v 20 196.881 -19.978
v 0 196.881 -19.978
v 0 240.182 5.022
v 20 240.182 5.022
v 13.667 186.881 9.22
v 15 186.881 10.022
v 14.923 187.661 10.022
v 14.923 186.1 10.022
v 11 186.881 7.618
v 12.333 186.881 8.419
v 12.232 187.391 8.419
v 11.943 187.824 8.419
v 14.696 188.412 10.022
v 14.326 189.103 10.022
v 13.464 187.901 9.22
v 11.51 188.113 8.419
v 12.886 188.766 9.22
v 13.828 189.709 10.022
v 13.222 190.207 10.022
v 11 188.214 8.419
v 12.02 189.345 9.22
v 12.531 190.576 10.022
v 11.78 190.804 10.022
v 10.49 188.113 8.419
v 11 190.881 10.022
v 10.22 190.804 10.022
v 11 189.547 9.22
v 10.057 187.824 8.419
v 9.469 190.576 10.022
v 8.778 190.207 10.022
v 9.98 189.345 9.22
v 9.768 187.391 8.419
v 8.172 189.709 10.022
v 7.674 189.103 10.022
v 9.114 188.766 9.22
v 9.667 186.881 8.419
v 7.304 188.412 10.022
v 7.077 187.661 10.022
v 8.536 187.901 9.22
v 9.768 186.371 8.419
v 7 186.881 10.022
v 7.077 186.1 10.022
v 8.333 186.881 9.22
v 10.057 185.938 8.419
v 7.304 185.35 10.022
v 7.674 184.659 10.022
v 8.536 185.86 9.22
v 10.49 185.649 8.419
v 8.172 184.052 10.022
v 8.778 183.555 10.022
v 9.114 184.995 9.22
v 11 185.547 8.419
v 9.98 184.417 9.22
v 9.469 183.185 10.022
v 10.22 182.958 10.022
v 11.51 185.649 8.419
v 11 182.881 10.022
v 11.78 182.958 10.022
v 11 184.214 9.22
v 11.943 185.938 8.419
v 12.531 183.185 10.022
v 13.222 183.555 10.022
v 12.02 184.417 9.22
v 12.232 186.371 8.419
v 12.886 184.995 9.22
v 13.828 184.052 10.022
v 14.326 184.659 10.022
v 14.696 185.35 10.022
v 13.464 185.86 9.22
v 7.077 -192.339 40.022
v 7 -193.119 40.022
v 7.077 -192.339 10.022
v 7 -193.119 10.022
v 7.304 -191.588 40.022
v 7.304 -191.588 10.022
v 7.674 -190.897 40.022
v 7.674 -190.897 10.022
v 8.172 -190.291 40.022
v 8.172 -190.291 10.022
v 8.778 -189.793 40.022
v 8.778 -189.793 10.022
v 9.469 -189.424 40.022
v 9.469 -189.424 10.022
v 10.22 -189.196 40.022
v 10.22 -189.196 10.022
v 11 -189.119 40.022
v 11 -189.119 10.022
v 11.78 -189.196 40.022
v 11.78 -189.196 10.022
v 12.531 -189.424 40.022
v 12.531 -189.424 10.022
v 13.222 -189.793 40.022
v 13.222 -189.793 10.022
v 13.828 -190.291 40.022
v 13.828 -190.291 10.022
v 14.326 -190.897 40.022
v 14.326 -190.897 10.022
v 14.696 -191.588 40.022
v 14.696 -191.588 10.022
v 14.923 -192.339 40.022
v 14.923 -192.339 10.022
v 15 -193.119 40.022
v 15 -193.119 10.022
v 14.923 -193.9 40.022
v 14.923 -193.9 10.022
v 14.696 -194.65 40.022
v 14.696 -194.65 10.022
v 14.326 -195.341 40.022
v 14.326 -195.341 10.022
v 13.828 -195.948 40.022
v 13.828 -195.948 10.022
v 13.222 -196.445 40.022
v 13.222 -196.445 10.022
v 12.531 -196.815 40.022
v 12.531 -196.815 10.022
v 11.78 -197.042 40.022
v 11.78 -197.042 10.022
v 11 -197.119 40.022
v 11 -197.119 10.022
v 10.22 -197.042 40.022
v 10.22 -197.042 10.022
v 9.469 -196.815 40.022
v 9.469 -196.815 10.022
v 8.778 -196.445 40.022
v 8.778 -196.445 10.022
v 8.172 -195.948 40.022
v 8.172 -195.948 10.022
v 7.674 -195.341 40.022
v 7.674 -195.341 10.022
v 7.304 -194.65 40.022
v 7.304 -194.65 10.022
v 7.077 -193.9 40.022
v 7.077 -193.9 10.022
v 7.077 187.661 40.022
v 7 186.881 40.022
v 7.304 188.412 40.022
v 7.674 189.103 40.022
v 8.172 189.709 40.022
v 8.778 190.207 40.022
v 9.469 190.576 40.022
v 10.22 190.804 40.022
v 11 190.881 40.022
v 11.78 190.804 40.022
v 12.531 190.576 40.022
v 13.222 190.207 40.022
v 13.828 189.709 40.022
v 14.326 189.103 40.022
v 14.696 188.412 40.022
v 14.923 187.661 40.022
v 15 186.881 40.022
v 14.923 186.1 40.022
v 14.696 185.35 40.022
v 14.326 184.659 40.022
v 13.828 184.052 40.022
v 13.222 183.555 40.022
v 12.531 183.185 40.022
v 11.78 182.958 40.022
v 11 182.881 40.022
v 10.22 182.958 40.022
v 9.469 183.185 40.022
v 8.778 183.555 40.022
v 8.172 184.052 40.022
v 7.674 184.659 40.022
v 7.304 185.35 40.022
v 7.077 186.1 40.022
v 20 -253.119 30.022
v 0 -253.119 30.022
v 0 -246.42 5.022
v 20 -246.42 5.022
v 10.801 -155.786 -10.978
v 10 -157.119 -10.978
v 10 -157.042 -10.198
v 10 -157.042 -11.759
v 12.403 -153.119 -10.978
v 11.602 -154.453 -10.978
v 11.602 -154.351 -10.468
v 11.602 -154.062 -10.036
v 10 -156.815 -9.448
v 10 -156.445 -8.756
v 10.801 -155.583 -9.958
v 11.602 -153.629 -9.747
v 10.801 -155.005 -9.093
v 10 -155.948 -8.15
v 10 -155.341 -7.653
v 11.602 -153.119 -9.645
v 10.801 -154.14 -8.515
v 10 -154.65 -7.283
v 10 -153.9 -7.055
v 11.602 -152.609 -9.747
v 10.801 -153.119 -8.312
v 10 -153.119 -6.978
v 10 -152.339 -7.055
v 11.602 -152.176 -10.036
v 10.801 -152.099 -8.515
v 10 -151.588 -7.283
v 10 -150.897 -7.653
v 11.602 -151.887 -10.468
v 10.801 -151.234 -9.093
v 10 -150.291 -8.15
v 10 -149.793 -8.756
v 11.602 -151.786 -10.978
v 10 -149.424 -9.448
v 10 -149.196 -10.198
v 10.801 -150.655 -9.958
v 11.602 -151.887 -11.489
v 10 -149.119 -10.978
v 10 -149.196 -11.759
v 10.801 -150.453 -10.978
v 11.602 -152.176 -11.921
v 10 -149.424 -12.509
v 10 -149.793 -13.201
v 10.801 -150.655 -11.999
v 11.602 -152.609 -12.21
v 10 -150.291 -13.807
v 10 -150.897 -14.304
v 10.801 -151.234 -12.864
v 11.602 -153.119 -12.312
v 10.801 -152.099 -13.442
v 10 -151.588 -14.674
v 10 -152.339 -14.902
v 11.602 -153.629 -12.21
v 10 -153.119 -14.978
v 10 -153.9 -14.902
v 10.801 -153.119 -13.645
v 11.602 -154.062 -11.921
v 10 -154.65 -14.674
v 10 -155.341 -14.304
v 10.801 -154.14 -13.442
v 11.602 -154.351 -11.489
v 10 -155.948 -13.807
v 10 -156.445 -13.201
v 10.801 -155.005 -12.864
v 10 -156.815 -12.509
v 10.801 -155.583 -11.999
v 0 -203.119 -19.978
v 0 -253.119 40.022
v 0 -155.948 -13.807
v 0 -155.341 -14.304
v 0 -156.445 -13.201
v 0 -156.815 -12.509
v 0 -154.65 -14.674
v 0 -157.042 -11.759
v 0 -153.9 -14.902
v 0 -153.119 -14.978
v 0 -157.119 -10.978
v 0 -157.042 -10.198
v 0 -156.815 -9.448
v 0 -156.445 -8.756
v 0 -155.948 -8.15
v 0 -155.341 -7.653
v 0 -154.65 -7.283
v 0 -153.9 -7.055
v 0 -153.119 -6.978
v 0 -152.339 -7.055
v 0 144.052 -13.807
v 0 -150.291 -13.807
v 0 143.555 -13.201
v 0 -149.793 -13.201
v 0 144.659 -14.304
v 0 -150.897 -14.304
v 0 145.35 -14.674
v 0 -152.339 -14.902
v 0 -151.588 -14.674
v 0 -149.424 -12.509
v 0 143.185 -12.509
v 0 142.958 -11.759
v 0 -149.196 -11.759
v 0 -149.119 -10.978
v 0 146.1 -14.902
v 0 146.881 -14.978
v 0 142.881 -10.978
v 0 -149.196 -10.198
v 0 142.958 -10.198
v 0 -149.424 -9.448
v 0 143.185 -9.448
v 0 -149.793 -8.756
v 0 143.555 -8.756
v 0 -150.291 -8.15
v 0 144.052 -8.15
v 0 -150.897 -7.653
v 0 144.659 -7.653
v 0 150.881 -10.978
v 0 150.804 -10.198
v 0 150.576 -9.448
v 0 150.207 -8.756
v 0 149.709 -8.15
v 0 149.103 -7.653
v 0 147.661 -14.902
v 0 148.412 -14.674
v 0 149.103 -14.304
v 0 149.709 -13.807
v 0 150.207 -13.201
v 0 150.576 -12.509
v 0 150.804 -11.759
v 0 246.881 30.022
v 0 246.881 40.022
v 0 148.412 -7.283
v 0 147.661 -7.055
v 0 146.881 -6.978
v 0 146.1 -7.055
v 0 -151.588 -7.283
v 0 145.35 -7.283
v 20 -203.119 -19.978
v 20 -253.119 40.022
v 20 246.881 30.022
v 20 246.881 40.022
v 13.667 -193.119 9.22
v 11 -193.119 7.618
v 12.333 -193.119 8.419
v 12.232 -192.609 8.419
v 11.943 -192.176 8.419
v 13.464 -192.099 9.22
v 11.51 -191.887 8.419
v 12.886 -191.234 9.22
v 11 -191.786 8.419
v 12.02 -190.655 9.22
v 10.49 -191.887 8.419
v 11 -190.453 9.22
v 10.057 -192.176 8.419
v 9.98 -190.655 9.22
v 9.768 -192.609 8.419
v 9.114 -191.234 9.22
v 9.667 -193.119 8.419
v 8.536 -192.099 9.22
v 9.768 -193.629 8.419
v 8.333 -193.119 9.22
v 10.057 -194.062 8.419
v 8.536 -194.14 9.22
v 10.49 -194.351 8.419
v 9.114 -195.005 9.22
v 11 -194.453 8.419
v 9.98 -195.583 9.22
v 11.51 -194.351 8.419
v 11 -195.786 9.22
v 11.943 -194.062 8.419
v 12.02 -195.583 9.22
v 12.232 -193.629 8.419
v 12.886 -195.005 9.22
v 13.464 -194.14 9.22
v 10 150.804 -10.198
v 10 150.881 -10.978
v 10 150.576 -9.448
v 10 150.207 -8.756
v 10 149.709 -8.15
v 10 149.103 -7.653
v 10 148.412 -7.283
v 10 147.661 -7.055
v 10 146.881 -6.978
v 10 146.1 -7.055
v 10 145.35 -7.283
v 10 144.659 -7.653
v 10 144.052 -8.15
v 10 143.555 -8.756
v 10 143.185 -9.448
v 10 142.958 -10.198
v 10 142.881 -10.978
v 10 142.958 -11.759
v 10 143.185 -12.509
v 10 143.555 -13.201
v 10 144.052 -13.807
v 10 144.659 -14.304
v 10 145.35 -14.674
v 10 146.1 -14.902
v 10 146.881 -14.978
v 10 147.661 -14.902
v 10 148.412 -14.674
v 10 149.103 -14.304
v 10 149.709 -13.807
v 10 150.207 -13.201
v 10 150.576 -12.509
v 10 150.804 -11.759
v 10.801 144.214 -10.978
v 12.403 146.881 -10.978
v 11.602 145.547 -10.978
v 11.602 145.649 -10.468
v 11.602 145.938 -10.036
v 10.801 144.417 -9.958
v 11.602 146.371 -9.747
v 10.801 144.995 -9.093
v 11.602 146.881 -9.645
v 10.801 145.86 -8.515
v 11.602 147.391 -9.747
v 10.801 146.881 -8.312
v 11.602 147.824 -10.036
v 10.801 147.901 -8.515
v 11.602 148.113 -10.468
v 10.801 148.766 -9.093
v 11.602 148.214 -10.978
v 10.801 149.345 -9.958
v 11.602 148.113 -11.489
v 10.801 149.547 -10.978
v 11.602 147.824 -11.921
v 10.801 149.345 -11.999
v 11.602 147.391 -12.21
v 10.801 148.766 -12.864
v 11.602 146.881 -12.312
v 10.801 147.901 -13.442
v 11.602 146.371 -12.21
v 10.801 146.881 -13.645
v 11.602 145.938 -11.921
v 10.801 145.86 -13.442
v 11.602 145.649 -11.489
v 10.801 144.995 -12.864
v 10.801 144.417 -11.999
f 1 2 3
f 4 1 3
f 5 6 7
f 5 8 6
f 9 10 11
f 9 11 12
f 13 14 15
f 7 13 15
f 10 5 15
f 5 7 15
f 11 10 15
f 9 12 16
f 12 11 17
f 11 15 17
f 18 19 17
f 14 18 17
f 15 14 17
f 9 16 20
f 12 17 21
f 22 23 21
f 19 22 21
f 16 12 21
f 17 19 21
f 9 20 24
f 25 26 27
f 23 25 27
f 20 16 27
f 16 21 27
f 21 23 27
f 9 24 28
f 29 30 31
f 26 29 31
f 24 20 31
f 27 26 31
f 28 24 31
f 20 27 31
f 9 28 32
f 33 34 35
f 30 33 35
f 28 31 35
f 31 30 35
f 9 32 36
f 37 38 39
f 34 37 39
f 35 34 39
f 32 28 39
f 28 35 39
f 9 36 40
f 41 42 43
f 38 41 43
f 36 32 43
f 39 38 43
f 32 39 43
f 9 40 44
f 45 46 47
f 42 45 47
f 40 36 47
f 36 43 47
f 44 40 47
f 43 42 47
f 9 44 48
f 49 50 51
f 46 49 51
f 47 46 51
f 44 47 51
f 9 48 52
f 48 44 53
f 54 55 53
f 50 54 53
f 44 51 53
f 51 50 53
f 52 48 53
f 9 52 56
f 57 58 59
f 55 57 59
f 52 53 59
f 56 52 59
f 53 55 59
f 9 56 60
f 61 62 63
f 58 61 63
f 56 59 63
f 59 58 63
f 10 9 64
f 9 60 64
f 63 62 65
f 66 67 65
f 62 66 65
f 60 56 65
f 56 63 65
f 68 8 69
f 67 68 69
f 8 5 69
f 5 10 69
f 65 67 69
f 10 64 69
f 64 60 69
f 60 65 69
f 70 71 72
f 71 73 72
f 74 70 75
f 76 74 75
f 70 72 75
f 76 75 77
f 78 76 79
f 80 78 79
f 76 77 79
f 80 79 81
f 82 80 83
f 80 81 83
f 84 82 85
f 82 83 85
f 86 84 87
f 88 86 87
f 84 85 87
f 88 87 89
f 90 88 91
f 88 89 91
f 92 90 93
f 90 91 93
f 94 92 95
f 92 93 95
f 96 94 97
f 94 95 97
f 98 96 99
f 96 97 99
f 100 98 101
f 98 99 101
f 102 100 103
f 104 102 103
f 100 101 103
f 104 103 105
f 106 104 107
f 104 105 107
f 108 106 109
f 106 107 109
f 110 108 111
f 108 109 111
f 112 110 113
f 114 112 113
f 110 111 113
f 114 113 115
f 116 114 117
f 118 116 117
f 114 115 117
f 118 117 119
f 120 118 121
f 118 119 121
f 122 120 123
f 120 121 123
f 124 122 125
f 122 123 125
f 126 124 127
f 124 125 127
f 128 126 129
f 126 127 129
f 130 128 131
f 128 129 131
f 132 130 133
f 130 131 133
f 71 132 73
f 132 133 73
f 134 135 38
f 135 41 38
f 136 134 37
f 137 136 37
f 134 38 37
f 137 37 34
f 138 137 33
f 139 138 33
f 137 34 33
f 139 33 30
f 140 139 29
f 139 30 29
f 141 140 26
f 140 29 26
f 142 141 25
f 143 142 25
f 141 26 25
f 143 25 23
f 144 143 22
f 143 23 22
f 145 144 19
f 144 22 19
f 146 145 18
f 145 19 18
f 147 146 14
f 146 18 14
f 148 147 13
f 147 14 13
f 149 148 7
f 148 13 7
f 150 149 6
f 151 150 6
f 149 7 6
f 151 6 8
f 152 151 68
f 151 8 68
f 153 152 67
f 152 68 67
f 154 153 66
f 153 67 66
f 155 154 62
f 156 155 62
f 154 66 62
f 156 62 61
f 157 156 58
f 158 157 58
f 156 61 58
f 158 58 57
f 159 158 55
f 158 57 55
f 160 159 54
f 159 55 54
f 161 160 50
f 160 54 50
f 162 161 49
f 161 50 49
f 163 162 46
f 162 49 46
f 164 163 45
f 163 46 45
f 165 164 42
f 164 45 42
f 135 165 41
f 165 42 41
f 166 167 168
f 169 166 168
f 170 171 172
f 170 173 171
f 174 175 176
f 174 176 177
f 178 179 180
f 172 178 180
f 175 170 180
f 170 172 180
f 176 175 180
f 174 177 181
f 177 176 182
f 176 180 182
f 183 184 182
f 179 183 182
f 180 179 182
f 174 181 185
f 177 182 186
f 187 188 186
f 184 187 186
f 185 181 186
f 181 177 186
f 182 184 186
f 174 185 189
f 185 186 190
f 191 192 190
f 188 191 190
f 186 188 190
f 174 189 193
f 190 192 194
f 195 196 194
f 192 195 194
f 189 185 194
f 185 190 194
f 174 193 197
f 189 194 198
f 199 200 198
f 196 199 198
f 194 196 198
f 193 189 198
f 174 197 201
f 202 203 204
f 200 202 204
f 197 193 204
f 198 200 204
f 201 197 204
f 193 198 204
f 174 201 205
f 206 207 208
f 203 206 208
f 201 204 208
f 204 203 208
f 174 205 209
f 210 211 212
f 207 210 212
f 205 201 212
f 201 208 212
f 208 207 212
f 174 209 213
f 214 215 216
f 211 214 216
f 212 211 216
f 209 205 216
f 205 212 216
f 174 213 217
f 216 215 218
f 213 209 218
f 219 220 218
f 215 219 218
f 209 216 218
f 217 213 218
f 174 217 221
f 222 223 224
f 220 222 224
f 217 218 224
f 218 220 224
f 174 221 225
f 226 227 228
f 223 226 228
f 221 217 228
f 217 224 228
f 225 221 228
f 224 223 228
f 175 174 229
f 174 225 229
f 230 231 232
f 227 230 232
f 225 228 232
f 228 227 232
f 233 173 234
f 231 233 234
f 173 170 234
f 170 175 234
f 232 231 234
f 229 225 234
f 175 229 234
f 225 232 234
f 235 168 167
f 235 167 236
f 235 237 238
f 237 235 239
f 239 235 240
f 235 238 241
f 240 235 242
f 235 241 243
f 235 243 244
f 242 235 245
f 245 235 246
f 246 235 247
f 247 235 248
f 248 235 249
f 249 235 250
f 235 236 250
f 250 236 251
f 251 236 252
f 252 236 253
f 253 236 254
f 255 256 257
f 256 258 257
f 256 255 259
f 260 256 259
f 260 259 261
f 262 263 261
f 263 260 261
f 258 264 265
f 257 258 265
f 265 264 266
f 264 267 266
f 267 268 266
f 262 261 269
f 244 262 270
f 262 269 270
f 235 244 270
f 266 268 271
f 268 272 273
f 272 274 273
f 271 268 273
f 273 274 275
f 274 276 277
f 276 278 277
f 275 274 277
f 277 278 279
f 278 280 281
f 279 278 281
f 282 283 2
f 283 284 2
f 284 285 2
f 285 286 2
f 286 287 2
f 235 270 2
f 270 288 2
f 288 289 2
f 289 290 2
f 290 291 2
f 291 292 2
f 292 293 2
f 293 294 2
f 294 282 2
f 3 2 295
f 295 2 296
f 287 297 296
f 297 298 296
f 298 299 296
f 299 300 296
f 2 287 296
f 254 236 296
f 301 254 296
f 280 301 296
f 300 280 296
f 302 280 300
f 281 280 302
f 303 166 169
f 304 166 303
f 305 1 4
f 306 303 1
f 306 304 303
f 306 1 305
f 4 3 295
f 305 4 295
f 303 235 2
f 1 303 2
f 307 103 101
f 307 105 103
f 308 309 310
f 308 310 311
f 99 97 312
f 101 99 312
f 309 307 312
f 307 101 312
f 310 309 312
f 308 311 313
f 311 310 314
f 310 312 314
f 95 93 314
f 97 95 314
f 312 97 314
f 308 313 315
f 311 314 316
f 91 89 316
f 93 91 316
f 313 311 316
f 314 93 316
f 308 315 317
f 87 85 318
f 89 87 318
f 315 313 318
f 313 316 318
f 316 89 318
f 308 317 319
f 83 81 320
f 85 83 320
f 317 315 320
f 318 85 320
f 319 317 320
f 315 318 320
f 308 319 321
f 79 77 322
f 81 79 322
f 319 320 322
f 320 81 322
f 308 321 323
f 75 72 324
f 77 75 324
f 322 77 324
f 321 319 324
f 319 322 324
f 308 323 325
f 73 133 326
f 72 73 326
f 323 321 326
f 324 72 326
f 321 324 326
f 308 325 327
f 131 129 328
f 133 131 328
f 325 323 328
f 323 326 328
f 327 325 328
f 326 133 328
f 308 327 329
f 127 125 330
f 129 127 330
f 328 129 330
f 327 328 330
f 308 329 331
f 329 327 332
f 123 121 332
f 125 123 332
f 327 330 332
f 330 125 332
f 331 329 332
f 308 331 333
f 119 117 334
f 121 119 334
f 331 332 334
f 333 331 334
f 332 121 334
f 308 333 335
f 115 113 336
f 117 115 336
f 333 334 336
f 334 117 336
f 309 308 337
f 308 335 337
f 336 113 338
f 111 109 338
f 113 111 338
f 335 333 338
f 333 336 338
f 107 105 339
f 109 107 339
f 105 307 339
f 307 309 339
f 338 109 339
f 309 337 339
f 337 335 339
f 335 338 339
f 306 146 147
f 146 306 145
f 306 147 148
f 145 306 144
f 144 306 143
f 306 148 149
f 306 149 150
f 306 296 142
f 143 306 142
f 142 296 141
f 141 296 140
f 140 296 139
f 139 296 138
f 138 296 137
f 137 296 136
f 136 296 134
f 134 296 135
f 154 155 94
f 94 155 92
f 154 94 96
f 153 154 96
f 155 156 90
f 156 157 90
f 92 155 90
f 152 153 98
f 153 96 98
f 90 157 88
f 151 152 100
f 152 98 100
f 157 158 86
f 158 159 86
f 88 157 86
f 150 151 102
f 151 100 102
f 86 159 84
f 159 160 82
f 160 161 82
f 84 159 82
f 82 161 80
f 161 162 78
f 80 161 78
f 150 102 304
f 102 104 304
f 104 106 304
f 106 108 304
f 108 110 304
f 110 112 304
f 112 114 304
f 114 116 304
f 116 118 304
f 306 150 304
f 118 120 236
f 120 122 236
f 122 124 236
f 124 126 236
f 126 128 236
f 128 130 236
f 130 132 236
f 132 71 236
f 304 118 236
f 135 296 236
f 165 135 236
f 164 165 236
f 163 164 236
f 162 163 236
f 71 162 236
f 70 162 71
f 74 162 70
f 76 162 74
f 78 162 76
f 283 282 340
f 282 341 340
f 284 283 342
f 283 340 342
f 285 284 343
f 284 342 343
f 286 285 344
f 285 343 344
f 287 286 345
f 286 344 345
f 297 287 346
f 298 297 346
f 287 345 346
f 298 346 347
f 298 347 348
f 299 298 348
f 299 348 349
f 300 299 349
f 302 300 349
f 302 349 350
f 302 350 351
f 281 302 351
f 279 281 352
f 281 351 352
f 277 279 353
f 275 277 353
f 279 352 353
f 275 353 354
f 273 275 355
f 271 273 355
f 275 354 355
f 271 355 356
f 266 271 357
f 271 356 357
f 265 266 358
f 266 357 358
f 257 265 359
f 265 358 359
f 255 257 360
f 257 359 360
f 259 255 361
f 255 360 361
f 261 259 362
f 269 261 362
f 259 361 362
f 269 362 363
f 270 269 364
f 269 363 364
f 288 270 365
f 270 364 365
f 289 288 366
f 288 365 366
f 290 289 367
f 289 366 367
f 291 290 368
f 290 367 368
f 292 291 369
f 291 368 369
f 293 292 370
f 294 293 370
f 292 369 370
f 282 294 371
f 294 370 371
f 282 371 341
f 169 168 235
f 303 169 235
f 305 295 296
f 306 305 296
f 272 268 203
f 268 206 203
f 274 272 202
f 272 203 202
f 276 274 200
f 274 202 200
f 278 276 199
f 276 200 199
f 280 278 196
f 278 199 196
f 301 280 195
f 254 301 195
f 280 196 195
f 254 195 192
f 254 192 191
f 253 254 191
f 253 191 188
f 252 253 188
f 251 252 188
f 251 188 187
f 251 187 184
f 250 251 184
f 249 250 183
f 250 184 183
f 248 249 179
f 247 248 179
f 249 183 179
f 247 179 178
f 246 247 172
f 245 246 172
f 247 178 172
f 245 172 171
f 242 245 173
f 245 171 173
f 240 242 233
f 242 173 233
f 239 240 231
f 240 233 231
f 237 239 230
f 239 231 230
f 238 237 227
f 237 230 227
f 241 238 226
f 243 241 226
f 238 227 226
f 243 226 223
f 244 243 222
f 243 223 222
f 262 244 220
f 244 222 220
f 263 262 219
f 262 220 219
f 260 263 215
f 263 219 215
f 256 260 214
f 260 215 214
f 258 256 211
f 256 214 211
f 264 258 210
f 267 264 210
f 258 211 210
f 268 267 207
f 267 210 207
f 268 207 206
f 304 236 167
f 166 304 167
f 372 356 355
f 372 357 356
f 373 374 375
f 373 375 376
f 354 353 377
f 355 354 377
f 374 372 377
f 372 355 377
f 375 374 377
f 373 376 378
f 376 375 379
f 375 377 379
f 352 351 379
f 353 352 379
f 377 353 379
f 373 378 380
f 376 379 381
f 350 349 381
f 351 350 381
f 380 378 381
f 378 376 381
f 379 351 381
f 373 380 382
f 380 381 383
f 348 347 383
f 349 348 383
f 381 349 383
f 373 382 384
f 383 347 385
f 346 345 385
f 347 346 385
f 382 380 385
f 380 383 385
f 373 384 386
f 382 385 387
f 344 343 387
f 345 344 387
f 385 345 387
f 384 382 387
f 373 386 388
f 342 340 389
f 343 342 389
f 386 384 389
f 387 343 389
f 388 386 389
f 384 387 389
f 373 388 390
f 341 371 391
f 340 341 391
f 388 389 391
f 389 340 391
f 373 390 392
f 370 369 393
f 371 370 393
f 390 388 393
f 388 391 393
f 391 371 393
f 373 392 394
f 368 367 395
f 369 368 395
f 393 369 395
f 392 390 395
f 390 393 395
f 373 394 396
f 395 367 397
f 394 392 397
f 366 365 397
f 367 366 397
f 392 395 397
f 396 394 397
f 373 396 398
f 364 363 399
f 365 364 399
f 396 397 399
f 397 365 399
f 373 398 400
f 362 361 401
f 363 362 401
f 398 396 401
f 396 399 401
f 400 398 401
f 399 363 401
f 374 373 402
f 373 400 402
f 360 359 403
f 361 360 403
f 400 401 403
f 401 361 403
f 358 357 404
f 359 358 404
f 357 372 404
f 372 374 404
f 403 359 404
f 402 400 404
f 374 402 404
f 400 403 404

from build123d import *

# Parameters (mm, degrees)
F1_DEPTH = 20
F4_D     = 8
F4_DEPTH = 30
F4_TIP   = 2.4034424761
F5_D     = 8
F5_DEPTH = 10
F5_TIP   = 2.4034424761


with BuildPart() as f1:
    # F0 (on Right) → F1 (new body)
    with BuildSketch(Plane.YZ):
        Polygon((246.8808323145, 30.0215791241), (246.8808323145, 40.0215791241), (-253.1191676855, 40.0215791241), (-253.1191676855, 30.0215791241), (-246.4204378747, 5.0215791241), (-203.1191676855, -19.9784208759), (196.8808323145, -19.9784208759), (240.1821025037, 5.0215791241), align=None)
    extrude(amount=F1_DEPTH)

    # F4
    with Locations(Plane.XY.offset(40.0215791241)):
        with Locations((11, 186.8808323145), (11, -193.1191676855)):
            Hole(F4_D / 2, depth=F4_DEPTH)
            with Locations((0, 0, -(F4_DEPTH + F4_TIP / 2))):  # 118° drill point
                Cone(0, F4_D / 2, F4_TIP, mode=Mode.SUBTRACT)

    # F5
    with Locations(Plane(origin=(0, 0, 0), x_dir=(0, -1, 0), z_dir=(-1, 0, 0))):
        with Locations((153.1191676855, -10.9784208759), (-146.8808323145, -10.9784208759)):
            Hole(F5_D / 2, depth=F5_DEPTH)
            with Locations((0, 0, -(F5_DEPTH + F5_TIP / 2))):  # 118° drill point
                Cone(0, F5_D / 2, F5_TIP, mode=Mode.SUBTRACT)


solid = f1.part
